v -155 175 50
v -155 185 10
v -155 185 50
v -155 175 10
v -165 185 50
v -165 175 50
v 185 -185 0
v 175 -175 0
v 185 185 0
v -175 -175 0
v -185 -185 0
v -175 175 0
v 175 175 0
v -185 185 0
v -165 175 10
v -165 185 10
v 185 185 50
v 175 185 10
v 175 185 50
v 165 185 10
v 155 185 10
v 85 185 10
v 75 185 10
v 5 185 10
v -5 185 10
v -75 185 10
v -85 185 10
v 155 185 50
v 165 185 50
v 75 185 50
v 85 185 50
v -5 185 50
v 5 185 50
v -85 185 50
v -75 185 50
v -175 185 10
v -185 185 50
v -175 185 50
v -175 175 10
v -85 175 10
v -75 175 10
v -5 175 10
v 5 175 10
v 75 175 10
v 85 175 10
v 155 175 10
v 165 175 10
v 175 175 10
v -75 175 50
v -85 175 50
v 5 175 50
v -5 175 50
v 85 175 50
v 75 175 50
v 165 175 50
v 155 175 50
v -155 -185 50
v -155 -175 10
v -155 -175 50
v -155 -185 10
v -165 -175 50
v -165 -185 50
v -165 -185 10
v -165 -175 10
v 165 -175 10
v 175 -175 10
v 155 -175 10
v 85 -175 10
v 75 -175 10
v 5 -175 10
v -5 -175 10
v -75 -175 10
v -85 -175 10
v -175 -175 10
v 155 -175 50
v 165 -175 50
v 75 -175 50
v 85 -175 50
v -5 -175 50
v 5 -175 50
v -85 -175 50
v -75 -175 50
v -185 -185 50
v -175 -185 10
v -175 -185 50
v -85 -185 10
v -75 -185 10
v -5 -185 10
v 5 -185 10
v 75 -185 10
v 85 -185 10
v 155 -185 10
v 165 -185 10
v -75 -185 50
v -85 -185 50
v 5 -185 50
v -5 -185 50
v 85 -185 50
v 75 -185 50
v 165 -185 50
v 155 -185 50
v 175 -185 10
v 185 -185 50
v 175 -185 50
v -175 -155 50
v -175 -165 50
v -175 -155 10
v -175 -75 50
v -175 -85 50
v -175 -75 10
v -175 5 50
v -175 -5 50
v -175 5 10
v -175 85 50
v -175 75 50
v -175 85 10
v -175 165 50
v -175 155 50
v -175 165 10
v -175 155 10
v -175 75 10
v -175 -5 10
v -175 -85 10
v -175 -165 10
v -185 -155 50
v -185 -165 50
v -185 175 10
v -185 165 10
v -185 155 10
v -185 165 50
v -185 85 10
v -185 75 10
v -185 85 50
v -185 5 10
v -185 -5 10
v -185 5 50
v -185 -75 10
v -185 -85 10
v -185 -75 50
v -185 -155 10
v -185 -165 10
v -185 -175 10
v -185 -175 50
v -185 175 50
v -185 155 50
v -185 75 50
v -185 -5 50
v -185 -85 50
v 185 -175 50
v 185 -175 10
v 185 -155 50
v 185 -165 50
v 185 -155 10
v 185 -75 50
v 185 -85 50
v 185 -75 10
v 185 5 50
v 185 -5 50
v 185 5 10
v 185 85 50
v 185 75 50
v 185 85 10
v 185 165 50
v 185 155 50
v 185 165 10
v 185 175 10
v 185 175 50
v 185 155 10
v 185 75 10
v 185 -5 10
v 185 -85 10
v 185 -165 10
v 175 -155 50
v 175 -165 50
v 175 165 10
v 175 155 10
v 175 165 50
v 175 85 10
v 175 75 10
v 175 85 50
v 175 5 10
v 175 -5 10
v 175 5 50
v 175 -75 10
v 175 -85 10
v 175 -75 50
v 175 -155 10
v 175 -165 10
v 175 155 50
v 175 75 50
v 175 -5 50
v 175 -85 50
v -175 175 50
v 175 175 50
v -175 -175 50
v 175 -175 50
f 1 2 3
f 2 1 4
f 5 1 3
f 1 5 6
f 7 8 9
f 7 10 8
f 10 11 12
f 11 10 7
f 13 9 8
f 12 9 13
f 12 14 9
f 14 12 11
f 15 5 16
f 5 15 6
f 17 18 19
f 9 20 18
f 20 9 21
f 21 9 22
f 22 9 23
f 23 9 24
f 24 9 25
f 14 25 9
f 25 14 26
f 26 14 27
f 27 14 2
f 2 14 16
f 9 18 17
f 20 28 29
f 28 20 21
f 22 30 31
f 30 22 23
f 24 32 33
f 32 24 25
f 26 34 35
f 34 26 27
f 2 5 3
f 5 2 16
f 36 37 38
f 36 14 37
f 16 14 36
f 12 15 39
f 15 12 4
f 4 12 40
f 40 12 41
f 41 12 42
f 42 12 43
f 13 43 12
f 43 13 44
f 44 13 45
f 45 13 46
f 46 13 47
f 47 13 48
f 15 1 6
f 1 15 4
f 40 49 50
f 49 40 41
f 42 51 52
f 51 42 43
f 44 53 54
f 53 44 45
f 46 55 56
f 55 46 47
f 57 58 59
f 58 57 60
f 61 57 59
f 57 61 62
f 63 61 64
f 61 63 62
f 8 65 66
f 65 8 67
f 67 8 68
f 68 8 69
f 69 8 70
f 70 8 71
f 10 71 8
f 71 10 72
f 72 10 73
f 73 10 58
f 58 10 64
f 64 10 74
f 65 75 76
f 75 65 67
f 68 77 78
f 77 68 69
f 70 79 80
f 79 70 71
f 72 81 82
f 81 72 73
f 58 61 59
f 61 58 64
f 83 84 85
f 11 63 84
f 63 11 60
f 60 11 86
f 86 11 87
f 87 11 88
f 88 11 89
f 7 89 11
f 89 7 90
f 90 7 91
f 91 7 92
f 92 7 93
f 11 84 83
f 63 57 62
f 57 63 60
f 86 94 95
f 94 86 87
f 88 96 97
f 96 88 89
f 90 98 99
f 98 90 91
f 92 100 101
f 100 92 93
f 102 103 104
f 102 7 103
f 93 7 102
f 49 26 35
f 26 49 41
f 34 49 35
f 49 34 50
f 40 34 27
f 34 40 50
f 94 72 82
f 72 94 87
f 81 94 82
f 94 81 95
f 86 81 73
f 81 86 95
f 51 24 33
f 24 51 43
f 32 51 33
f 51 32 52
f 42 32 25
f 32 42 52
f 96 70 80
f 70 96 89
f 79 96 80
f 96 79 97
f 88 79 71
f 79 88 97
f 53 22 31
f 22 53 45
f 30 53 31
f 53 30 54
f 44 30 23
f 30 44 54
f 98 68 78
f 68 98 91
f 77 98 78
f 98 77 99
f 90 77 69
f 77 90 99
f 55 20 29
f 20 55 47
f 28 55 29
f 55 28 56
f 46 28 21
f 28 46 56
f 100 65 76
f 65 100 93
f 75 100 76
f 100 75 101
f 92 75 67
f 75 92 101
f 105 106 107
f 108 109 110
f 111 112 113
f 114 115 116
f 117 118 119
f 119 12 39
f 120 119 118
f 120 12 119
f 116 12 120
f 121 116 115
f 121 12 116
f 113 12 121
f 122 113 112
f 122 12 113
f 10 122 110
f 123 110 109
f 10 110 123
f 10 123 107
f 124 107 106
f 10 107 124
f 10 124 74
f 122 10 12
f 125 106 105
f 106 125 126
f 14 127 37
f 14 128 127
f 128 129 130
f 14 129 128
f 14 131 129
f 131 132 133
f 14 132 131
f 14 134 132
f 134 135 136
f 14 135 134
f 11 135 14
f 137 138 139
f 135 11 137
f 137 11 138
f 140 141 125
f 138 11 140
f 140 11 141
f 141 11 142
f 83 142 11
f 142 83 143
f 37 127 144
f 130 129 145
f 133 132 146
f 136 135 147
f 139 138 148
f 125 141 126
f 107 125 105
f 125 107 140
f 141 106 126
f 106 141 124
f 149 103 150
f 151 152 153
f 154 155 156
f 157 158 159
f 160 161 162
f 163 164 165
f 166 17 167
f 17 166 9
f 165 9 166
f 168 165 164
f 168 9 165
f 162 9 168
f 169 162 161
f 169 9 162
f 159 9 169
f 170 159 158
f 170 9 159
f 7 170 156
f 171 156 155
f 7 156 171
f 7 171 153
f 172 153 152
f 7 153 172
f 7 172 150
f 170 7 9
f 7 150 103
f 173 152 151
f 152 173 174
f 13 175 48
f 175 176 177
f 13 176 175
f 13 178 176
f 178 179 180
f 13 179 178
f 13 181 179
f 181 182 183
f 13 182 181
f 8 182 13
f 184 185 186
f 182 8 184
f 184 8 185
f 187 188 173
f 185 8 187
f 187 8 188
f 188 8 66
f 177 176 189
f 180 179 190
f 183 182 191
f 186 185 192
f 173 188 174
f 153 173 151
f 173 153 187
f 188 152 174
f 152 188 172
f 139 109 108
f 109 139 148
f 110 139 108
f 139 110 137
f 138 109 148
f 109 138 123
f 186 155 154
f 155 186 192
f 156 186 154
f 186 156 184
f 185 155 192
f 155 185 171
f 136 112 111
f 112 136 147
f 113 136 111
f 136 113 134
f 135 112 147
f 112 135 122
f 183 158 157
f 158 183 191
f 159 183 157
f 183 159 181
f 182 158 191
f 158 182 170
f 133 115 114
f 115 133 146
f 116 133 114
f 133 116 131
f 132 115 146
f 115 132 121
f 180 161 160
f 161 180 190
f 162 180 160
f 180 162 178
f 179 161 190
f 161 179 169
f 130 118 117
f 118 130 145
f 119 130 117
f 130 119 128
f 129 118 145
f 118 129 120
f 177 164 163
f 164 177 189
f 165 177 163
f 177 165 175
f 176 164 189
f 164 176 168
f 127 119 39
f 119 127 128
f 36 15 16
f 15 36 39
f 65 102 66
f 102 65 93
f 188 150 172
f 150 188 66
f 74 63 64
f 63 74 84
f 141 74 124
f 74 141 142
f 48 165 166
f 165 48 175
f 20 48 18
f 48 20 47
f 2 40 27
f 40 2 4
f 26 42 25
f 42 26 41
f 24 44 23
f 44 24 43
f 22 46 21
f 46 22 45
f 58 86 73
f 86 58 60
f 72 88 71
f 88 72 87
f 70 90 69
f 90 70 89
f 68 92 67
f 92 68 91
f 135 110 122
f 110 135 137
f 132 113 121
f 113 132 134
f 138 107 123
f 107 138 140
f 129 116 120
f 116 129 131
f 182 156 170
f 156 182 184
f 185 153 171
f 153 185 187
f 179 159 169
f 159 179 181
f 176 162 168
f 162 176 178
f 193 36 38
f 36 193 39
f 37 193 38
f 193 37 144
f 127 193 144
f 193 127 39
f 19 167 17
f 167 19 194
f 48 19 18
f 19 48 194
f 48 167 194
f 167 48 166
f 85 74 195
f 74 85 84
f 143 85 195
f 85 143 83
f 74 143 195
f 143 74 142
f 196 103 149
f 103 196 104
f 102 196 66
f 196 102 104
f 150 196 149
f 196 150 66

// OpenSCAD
// Cage slice 0
// Internal cavity: 350 x 350 x 700 mm
// Bar thickness: 10 mm (square)
// Gap between bars: 70 mm (uniform)
// Slice index: 0, slice Z range: [0, 50] (local coordinates 0..50)
// This file places the slice with its bottom on Z=0; when assembling, translate in Z by 0 mm.
// Export to STL with OpenSCAD: Render -> Export as STL.

bar = 10;
gap = 70;
s = bar + gap;
$fn = 64;  // cylinder resolution

x_centers = [-160, -80, 0, 80, 160];
y_centers = [-160, -80, 0, 80, 160];
z_centers = [5, 85, 165, 245, 325, 405, 485, 565, 645];

slice_index = 0;
slice_h = 50;

front_y = 180;
back_y = -180;
left_x = -180;
right_x = 180;
panel_length = 370;

hole_diam = 6.6;

module slice() {
    union() {
        // vertical bars on front and back (along Z)
        for (x = x_centers) {
            translate([x, front_y, slice_h/2]) cube([bar, bar, slice_h], center=true);
            translate([x, back_y, slice_h/2])  cube([bar, bar, slice_h], center=true);
        }
        // vertical bars on left and right (along Z)
        for (y = y_centers) {
            translate([left_x, y, slice_h/2])  cube([bar, bar, slice_h], center=true);
            translate([right_x, y, slice_h/2]) cube([bar, bar, slice_h], center=true);
        }
        // explicit corner vertical bars (ensure 4 corners for M6 rods)
        translate([-180, 180, slice_h/2]) cube([bar, bar, slice_h], center=true);
        translate([180, 180, slice_h/2]) cube([bar, bar, slice_h], center=true);
        translate([-180, -180, slice_h/2]) cube([bar, bar, slice_h], center=true);
        translate([180, -180, slice_h/2]) cube([bar, bar, slice_h], center=true);

        // horizontal bars (10 mm thick in Z) that lie inside this slice
        for (zc = z_centers) {
            z_local = zc - slice_index*slice_h;
            // include this horizontal bar if its center lies within this slice and it fits entirely here
            if (z_local >= bar/2 && z_local <= slice_h - bar/2) {
                // front and back horizontal bars (run along X)
                translate([0, front_y, z_local]) cube([panel_length, bar, bar], center=true);
                translate([0, back_y,  z_local]) cube([panel_length, bar, bar], center=true);
                // left and right horizontal bars (run along Y)
                translate([left_x, 0, z_local]) cube([bar, panel_length, bar], center=true);
                translate([right_x,0, z_local]) cube([bar, panel_length, bar], center=true);
            }
        }
    }
}

difference() {
    slice();
    // four vertical holes for M6 rods through corner bars (slightly longer than slice to ensure clean subtraction)
    translate([-180, 180, slice_h/2]) rotate([0,0,0]) cylinder(h = slice_h*4, r = hole_diam/2, center=true);
    translate([180, 180, slice_h/2]) rotate([0,0,0]) cylinder(h = slice_h*4, r = hole_diam/2, center=true);
    translate([-180, -180, slice_h/2]) rotate([0,0,0]) cylinder(h = slice_h*4, r = hole_diam/2, center=true);
    translate([180, -180, slice_h/2]) rotate([0,0,0]) cylinder(h = slice_h*4, r = hole_diam/2, center=true);
}

slice();
